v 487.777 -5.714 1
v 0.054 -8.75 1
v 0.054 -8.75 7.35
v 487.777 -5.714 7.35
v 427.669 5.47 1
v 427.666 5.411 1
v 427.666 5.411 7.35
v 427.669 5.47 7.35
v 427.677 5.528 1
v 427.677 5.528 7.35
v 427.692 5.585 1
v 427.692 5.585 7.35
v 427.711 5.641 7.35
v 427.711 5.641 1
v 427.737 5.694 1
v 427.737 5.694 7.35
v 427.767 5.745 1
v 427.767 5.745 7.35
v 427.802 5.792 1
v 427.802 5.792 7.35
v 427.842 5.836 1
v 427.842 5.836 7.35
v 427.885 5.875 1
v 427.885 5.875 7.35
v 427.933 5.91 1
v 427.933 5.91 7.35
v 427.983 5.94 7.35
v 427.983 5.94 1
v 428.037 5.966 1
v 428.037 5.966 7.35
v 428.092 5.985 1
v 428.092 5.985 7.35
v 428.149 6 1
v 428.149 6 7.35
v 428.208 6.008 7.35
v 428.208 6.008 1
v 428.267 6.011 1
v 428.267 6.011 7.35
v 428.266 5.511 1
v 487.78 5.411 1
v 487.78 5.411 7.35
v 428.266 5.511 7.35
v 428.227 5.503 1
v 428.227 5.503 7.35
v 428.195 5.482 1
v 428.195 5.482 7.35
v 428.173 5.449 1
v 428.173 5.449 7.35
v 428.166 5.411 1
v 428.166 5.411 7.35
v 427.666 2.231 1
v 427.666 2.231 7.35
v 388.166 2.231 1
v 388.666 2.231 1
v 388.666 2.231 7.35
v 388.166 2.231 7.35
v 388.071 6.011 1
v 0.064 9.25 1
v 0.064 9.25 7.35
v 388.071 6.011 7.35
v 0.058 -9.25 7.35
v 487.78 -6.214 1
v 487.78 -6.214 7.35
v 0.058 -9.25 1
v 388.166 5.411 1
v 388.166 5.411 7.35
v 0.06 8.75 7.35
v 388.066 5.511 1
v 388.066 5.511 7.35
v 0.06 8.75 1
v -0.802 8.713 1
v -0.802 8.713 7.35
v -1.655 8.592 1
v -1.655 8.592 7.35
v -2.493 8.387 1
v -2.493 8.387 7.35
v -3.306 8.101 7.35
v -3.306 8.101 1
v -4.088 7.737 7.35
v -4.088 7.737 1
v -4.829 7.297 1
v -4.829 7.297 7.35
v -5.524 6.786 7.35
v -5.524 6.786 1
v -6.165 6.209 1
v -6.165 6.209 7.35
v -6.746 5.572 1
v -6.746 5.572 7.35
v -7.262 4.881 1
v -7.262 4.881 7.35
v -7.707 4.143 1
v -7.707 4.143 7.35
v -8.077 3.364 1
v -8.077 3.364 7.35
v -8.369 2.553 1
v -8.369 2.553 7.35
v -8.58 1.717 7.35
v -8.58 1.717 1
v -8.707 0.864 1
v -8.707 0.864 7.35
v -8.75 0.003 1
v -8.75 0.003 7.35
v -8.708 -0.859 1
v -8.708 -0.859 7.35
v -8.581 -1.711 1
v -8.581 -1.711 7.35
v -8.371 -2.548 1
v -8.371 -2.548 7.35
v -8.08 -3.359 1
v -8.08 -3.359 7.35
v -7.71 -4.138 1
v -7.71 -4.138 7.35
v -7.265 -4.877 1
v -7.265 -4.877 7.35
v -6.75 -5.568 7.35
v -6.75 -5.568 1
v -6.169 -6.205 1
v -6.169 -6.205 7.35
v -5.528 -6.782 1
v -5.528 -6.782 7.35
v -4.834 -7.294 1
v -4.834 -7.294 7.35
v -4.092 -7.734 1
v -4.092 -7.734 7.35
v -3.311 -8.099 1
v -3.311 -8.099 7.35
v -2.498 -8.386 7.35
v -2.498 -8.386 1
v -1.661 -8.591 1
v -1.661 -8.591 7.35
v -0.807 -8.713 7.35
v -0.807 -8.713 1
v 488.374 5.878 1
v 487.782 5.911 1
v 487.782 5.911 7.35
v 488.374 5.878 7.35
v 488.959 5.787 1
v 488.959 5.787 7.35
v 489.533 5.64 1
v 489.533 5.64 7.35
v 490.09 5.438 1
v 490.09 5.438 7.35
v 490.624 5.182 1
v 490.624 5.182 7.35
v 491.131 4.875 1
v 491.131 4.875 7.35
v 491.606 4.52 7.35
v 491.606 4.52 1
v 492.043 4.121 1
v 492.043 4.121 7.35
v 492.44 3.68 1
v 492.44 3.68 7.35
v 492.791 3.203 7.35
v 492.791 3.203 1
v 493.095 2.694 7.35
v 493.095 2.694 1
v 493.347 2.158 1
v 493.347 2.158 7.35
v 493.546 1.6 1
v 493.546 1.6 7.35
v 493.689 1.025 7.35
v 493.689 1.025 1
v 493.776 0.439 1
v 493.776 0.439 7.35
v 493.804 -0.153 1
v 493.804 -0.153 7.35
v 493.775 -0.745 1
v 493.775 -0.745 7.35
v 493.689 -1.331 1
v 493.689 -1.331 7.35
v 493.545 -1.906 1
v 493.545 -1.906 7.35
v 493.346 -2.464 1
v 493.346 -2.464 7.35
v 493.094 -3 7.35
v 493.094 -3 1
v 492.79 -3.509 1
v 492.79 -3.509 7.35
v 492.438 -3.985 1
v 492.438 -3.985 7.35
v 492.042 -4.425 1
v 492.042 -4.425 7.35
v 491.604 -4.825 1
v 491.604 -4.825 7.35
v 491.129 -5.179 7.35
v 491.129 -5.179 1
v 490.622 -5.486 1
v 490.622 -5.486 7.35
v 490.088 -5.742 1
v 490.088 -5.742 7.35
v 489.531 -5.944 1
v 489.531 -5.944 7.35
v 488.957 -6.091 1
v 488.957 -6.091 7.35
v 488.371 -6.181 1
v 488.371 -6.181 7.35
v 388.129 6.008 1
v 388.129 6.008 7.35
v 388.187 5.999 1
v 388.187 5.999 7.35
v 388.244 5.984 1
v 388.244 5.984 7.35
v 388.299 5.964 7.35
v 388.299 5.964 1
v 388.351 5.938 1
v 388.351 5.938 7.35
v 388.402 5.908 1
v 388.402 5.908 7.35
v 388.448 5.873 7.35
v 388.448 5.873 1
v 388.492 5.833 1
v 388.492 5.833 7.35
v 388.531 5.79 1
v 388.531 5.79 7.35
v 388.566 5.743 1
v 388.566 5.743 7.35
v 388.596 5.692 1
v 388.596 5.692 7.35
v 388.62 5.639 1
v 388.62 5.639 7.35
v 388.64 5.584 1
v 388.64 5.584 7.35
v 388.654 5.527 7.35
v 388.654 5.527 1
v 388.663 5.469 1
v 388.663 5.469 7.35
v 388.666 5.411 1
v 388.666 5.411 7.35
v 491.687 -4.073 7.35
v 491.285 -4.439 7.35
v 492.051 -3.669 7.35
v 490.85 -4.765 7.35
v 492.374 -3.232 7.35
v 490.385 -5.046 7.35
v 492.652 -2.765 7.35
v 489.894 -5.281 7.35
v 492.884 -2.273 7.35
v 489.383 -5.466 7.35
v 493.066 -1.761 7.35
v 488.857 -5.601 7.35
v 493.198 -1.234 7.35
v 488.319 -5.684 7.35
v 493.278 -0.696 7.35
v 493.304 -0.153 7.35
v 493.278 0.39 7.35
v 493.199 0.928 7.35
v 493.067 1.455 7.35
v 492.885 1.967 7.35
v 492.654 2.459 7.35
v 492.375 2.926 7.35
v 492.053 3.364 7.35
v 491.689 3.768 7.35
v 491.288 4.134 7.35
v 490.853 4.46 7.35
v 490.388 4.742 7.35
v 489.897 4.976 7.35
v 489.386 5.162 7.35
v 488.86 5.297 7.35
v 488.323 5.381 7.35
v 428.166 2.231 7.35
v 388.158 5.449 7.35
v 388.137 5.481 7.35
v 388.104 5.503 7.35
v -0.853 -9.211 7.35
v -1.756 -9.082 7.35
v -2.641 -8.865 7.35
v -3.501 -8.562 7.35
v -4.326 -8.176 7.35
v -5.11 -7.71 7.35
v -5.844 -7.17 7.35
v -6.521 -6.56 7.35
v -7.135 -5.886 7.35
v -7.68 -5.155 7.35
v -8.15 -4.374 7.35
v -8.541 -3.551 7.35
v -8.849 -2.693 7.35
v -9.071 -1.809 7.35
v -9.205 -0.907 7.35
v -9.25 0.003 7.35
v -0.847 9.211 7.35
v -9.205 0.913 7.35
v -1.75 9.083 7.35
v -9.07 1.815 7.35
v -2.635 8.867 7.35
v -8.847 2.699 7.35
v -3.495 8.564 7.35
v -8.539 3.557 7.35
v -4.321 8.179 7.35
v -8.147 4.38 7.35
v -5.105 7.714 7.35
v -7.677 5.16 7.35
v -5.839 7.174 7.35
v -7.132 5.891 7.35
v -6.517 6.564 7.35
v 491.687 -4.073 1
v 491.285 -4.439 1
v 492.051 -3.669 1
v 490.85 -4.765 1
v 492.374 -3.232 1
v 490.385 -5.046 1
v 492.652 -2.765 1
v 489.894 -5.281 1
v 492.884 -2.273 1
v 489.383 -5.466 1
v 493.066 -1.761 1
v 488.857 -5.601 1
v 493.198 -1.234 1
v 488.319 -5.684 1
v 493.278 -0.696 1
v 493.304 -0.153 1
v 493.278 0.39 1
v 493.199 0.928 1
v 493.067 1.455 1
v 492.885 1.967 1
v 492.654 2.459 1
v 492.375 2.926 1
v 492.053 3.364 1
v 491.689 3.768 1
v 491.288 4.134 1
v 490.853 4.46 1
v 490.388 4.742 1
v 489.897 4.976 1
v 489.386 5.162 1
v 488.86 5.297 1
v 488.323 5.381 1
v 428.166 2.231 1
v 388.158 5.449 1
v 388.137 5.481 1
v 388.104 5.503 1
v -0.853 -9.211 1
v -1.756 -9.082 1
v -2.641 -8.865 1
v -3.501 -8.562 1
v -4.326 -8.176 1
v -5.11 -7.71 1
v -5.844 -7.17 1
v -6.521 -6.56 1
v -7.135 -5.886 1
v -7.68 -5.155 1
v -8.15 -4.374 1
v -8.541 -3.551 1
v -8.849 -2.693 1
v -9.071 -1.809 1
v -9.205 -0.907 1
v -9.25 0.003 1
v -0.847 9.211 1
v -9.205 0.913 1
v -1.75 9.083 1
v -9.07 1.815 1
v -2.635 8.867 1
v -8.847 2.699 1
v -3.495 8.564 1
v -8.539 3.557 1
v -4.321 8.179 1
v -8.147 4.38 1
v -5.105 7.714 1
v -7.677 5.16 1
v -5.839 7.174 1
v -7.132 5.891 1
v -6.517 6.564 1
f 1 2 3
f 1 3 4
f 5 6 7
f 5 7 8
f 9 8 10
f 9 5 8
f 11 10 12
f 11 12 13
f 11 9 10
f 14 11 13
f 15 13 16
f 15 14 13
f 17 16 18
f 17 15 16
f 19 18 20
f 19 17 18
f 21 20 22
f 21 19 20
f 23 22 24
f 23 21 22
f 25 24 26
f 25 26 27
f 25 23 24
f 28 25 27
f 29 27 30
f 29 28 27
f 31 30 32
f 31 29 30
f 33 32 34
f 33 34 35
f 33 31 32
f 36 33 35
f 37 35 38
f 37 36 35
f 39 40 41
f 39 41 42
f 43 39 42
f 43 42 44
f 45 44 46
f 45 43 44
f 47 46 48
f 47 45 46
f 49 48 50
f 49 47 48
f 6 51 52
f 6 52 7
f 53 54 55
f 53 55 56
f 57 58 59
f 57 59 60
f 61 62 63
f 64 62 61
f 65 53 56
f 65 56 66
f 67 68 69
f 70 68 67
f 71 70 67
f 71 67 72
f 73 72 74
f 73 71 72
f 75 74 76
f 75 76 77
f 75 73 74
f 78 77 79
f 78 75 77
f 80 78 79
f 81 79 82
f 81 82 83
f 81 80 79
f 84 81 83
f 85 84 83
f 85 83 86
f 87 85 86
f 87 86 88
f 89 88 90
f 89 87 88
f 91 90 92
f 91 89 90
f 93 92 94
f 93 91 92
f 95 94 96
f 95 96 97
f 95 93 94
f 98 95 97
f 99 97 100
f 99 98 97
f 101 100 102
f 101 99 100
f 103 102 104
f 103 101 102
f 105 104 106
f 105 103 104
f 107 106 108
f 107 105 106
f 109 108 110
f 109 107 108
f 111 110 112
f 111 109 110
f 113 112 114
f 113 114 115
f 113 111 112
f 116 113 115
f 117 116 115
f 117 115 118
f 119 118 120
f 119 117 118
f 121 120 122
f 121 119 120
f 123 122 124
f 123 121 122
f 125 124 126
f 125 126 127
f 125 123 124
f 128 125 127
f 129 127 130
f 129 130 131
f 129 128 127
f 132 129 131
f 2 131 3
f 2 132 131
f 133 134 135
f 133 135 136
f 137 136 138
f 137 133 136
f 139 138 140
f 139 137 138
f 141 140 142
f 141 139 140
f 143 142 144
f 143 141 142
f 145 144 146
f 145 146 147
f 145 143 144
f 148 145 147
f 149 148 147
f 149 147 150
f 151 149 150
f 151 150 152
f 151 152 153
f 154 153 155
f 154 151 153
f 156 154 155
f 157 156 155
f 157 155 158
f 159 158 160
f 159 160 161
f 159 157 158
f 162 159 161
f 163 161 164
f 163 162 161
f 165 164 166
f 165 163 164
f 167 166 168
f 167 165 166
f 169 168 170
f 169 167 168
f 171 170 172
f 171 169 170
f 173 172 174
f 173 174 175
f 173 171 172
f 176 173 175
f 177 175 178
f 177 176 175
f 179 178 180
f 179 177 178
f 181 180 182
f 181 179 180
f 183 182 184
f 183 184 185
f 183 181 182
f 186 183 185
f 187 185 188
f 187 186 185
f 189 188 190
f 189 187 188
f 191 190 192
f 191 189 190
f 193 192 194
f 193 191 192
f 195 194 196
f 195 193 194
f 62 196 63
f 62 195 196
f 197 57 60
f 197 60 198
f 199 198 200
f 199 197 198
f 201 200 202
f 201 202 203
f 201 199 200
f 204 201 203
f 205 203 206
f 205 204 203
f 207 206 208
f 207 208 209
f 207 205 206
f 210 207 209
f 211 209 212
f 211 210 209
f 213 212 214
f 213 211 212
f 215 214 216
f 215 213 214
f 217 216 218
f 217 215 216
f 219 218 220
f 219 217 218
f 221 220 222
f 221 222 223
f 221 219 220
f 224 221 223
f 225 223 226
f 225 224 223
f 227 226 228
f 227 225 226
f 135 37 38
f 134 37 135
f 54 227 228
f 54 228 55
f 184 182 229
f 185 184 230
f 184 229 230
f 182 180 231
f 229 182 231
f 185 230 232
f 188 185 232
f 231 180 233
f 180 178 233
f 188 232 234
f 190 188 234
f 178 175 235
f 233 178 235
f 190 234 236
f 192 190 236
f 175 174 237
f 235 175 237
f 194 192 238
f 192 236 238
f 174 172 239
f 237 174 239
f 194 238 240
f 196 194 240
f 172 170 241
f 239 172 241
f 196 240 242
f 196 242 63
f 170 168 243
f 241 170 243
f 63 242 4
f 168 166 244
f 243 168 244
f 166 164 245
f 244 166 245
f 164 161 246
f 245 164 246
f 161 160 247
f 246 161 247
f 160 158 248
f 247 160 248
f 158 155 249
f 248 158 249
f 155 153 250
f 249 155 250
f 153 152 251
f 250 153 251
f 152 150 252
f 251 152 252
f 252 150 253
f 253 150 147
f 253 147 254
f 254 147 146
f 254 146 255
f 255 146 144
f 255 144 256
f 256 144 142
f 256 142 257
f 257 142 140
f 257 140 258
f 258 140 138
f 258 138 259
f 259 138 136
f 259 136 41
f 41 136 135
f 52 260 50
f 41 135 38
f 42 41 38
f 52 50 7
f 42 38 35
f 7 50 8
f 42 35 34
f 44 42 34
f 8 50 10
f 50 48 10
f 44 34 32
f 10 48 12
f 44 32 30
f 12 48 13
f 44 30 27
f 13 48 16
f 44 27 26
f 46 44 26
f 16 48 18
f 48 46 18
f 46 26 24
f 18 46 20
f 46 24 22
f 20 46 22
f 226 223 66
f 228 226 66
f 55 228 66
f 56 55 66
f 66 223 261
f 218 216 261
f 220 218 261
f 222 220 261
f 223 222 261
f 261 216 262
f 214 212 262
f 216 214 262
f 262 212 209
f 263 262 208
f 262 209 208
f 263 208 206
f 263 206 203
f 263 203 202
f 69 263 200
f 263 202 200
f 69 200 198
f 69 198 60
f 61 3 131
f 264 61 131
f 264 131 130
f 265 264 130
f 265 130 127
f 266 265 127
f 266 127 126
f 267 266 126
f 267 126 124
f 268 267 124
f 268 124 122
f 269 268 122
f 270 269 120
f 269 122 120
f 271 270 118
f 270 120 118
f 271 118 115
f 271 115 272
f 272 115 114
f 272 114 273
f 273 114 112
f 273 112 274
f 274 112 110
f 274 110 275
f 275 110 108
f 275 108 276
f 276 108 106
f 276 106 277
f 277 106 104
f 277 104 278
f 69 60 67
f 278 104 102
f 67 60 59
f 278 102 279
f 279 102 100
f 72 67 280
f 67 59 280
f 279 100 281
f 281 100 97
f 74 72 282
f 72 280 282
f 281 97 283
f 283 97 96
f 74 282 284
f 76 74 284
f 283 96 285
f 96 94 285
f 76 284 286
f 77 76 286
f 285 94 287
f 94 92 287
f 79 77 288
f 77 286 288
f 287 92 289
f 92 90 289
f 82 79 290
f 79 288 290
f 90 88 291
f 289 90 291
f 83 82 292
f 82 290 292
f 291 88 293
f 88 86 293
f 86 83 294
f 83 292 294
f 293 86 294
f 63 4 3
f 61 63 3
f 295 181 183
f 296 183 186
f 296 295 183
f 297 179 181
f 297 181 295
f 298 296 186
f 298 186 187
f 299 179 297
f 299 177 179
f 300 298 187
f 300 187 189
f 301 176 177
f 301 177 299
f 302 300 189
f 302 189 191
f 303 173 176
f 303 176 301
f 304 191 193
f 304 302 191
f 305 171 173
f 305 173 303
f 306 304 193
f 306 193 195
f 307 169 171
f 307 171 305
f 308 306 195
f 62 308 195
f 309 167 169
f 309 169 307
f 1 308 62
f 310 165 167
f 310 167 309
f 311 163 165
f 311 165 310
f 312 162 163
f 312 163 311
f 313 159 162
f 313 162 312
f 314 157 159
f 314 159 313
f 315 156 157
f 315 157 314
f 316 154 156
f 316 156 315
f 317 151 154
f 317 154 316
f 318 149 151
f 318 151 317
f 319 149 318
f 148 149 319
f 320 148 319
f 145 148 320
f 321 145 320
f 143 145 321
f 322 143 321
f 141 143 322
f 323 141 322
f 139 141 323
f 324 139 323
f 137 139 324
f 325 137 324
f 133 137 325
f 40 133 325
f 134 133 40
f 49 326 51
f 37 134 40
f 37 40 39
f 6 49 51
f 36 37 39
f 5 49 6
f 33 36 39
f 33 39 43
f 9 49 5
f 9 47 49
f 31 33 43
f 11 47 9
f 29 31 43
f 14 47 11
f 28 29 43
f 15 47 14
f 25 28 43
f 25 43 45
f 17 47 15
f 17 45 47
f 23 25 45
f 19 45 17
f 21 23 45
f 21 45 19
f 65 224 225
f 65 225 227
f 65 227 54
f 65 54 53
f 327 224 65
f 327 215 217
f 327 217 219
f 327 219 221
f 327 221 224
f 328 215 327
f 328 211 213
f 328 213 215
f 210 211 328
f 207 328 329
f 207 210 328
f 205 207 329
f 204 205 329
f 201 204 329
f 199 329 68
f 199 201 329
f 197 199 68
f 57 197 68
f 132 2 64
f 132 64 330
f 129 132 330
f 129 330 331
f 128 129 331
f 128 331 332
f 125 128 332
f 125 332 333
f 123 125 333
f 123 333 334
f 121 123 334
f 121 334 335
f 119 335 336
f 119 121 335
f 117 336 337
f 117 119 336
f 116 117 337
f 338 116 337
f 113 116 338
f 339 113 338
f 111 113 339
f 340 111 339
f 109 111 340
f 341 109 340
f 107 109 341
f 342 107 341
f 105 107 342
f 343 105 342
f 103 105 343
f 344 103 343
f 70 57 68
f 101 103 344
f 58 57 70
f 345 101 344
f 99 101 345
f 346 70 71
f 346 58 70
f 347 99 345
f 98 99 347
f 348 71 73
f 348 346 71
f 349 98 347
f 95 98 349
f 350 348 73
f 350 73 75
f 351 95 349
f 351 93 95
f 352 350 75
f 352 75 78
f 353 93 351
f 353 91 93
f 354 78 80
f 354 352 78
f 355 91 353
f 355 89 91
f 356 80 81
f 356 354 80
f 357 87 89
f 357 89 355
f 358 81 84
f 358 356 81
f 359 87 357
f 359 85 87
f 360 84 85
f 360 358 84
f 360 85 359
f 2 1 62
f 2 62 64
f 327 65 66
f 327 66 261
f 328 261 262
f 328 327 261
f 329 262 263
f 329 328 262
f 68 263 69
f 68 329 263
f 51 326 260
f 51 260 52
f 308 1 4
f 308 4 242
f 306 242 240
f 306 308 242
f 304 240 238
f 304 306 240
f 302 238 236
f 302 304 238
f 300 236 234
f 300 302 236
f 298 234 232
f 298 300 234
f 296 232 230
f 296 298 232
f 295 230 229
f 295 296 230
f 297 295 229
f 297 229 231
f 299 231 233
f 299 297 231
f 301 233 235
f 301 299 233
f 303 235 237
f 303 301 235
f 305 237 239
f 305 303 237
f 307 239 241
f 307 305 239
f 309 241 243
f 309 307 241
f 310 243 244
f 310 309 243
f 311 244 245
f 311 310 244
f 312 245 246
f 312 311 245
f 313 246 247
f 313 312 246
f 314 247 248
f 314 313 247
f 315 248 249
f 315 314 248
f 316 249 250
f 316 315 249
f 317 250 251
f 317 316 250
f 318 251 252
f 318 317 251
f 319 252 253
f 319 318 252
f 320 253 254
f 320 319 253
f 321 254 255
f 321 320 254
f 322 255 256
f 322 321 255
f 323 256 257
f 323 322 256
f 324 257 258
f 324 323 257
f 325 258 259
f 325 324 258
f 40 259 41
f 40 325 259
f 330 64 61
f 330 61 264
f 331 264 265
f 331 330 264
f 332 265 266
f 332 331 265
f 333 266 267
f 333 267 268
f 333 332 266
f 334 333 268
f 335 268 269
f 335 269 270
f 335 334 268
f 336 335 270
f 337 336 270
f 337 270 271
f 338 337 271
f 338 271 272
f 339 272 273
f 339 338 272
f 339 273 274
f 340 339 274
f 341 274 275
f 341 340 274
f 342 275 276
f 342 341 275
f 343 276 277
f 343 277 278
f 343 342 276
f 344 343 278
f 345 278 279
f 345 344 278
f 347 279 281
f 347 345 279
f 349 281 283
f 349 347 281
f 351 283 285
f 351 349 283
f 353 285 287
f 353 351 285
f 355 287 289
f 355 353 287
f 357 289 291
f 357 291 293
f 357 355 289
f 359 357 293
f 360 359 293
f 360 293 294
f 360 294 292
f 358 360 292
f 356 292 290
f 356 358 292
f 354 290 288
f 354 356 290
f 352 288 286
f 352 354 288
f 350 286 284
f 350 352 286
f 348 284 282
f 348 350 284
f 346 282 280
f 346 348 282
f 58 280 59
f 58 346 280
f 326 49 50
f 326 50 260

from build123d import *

# Parameters (mm, degrees)
EXTRUDE_THIN1_START = 1
EXTRUDE_THIN1_DEPTH = 6.35


with BuildPart() as part:
    # Sketch1 → Extrude-Thin1 (new body)
    with BuildSketch(Plane.XY.offset(EXTRUDE_THIN1_START)):
        with BuildLine():
            Line((388.165618503, 2.23097434), (388.165618503, 5.41097434))
            ThreePointArc((388.165618503, 5.41097434), (388.136623681, 5.481389287), (388.066453208, 5.510970857))
            Line((388.066453208, 5.510970857), (0.059901443, 8.749794959))
            ThreePointArc((0.059901443, 8.749794959), (-8.749999578, 0.002718342), (0.054464874, -8.749830488))
            Line((0.054464874, -8.749830488), (487.776522402, -5.713917899))
            ThreePointArc((487.776522402, -5.713917899), (493.304398035, -0.153253749), (487.779978506, 5.410843992))
            Line((487.779978506, 5.410843992), (428.265786749, 5.510974199))
            ThreePointArc((428.265786749, 5.510974199), (428.194967334, 5.481744477), (428.165618503, 5.41097434))
            Line((428.165618503, 5.41097434), (428.165618503, 2.23097434))
            Line((428.165618503, 2.23097434), (427.665618503, 2.23097434))
            Line((427.665618503, 2.23097434), (427.665618503, 5.41097434))
            ThreePointArc((427.665618503, 5.410974341), (427.841711488, 5.835595162), (428.266627977, 6.010973491))
            Line((428.266627977, 6.010973491), (487.78208283, 5.91084116))
            ThreePointArc((487.78208283, 5.91084116), (493.804398179, -0.15274976), (487.77963468, -6.213908213))
            Line((487.77963468, -6.213908213), (0.057577153, -9.249820802))
            ThreePointArc((0.057577153, -9.249820802), (-9.249999493, 0.003063934), (0.063704889, 9.249780629))
            Line((0.063704889, 9.249780629), (388.070626735, 6.010953438))
            ThreePointArc((388.070626735, 6.010953438), (388.491649569, 5.833464021), (388.665618503, 5.410974341))
            Line((388.665618503, 5.410974341), (388.665618503, 2.23097434))
            Line((388.665618503, 2.23097434), (388.165618503, 2.23097434))
        make_face()
    extrude(amount=EXTRUDE_THIN1_DEPTH)


solid = part.part
